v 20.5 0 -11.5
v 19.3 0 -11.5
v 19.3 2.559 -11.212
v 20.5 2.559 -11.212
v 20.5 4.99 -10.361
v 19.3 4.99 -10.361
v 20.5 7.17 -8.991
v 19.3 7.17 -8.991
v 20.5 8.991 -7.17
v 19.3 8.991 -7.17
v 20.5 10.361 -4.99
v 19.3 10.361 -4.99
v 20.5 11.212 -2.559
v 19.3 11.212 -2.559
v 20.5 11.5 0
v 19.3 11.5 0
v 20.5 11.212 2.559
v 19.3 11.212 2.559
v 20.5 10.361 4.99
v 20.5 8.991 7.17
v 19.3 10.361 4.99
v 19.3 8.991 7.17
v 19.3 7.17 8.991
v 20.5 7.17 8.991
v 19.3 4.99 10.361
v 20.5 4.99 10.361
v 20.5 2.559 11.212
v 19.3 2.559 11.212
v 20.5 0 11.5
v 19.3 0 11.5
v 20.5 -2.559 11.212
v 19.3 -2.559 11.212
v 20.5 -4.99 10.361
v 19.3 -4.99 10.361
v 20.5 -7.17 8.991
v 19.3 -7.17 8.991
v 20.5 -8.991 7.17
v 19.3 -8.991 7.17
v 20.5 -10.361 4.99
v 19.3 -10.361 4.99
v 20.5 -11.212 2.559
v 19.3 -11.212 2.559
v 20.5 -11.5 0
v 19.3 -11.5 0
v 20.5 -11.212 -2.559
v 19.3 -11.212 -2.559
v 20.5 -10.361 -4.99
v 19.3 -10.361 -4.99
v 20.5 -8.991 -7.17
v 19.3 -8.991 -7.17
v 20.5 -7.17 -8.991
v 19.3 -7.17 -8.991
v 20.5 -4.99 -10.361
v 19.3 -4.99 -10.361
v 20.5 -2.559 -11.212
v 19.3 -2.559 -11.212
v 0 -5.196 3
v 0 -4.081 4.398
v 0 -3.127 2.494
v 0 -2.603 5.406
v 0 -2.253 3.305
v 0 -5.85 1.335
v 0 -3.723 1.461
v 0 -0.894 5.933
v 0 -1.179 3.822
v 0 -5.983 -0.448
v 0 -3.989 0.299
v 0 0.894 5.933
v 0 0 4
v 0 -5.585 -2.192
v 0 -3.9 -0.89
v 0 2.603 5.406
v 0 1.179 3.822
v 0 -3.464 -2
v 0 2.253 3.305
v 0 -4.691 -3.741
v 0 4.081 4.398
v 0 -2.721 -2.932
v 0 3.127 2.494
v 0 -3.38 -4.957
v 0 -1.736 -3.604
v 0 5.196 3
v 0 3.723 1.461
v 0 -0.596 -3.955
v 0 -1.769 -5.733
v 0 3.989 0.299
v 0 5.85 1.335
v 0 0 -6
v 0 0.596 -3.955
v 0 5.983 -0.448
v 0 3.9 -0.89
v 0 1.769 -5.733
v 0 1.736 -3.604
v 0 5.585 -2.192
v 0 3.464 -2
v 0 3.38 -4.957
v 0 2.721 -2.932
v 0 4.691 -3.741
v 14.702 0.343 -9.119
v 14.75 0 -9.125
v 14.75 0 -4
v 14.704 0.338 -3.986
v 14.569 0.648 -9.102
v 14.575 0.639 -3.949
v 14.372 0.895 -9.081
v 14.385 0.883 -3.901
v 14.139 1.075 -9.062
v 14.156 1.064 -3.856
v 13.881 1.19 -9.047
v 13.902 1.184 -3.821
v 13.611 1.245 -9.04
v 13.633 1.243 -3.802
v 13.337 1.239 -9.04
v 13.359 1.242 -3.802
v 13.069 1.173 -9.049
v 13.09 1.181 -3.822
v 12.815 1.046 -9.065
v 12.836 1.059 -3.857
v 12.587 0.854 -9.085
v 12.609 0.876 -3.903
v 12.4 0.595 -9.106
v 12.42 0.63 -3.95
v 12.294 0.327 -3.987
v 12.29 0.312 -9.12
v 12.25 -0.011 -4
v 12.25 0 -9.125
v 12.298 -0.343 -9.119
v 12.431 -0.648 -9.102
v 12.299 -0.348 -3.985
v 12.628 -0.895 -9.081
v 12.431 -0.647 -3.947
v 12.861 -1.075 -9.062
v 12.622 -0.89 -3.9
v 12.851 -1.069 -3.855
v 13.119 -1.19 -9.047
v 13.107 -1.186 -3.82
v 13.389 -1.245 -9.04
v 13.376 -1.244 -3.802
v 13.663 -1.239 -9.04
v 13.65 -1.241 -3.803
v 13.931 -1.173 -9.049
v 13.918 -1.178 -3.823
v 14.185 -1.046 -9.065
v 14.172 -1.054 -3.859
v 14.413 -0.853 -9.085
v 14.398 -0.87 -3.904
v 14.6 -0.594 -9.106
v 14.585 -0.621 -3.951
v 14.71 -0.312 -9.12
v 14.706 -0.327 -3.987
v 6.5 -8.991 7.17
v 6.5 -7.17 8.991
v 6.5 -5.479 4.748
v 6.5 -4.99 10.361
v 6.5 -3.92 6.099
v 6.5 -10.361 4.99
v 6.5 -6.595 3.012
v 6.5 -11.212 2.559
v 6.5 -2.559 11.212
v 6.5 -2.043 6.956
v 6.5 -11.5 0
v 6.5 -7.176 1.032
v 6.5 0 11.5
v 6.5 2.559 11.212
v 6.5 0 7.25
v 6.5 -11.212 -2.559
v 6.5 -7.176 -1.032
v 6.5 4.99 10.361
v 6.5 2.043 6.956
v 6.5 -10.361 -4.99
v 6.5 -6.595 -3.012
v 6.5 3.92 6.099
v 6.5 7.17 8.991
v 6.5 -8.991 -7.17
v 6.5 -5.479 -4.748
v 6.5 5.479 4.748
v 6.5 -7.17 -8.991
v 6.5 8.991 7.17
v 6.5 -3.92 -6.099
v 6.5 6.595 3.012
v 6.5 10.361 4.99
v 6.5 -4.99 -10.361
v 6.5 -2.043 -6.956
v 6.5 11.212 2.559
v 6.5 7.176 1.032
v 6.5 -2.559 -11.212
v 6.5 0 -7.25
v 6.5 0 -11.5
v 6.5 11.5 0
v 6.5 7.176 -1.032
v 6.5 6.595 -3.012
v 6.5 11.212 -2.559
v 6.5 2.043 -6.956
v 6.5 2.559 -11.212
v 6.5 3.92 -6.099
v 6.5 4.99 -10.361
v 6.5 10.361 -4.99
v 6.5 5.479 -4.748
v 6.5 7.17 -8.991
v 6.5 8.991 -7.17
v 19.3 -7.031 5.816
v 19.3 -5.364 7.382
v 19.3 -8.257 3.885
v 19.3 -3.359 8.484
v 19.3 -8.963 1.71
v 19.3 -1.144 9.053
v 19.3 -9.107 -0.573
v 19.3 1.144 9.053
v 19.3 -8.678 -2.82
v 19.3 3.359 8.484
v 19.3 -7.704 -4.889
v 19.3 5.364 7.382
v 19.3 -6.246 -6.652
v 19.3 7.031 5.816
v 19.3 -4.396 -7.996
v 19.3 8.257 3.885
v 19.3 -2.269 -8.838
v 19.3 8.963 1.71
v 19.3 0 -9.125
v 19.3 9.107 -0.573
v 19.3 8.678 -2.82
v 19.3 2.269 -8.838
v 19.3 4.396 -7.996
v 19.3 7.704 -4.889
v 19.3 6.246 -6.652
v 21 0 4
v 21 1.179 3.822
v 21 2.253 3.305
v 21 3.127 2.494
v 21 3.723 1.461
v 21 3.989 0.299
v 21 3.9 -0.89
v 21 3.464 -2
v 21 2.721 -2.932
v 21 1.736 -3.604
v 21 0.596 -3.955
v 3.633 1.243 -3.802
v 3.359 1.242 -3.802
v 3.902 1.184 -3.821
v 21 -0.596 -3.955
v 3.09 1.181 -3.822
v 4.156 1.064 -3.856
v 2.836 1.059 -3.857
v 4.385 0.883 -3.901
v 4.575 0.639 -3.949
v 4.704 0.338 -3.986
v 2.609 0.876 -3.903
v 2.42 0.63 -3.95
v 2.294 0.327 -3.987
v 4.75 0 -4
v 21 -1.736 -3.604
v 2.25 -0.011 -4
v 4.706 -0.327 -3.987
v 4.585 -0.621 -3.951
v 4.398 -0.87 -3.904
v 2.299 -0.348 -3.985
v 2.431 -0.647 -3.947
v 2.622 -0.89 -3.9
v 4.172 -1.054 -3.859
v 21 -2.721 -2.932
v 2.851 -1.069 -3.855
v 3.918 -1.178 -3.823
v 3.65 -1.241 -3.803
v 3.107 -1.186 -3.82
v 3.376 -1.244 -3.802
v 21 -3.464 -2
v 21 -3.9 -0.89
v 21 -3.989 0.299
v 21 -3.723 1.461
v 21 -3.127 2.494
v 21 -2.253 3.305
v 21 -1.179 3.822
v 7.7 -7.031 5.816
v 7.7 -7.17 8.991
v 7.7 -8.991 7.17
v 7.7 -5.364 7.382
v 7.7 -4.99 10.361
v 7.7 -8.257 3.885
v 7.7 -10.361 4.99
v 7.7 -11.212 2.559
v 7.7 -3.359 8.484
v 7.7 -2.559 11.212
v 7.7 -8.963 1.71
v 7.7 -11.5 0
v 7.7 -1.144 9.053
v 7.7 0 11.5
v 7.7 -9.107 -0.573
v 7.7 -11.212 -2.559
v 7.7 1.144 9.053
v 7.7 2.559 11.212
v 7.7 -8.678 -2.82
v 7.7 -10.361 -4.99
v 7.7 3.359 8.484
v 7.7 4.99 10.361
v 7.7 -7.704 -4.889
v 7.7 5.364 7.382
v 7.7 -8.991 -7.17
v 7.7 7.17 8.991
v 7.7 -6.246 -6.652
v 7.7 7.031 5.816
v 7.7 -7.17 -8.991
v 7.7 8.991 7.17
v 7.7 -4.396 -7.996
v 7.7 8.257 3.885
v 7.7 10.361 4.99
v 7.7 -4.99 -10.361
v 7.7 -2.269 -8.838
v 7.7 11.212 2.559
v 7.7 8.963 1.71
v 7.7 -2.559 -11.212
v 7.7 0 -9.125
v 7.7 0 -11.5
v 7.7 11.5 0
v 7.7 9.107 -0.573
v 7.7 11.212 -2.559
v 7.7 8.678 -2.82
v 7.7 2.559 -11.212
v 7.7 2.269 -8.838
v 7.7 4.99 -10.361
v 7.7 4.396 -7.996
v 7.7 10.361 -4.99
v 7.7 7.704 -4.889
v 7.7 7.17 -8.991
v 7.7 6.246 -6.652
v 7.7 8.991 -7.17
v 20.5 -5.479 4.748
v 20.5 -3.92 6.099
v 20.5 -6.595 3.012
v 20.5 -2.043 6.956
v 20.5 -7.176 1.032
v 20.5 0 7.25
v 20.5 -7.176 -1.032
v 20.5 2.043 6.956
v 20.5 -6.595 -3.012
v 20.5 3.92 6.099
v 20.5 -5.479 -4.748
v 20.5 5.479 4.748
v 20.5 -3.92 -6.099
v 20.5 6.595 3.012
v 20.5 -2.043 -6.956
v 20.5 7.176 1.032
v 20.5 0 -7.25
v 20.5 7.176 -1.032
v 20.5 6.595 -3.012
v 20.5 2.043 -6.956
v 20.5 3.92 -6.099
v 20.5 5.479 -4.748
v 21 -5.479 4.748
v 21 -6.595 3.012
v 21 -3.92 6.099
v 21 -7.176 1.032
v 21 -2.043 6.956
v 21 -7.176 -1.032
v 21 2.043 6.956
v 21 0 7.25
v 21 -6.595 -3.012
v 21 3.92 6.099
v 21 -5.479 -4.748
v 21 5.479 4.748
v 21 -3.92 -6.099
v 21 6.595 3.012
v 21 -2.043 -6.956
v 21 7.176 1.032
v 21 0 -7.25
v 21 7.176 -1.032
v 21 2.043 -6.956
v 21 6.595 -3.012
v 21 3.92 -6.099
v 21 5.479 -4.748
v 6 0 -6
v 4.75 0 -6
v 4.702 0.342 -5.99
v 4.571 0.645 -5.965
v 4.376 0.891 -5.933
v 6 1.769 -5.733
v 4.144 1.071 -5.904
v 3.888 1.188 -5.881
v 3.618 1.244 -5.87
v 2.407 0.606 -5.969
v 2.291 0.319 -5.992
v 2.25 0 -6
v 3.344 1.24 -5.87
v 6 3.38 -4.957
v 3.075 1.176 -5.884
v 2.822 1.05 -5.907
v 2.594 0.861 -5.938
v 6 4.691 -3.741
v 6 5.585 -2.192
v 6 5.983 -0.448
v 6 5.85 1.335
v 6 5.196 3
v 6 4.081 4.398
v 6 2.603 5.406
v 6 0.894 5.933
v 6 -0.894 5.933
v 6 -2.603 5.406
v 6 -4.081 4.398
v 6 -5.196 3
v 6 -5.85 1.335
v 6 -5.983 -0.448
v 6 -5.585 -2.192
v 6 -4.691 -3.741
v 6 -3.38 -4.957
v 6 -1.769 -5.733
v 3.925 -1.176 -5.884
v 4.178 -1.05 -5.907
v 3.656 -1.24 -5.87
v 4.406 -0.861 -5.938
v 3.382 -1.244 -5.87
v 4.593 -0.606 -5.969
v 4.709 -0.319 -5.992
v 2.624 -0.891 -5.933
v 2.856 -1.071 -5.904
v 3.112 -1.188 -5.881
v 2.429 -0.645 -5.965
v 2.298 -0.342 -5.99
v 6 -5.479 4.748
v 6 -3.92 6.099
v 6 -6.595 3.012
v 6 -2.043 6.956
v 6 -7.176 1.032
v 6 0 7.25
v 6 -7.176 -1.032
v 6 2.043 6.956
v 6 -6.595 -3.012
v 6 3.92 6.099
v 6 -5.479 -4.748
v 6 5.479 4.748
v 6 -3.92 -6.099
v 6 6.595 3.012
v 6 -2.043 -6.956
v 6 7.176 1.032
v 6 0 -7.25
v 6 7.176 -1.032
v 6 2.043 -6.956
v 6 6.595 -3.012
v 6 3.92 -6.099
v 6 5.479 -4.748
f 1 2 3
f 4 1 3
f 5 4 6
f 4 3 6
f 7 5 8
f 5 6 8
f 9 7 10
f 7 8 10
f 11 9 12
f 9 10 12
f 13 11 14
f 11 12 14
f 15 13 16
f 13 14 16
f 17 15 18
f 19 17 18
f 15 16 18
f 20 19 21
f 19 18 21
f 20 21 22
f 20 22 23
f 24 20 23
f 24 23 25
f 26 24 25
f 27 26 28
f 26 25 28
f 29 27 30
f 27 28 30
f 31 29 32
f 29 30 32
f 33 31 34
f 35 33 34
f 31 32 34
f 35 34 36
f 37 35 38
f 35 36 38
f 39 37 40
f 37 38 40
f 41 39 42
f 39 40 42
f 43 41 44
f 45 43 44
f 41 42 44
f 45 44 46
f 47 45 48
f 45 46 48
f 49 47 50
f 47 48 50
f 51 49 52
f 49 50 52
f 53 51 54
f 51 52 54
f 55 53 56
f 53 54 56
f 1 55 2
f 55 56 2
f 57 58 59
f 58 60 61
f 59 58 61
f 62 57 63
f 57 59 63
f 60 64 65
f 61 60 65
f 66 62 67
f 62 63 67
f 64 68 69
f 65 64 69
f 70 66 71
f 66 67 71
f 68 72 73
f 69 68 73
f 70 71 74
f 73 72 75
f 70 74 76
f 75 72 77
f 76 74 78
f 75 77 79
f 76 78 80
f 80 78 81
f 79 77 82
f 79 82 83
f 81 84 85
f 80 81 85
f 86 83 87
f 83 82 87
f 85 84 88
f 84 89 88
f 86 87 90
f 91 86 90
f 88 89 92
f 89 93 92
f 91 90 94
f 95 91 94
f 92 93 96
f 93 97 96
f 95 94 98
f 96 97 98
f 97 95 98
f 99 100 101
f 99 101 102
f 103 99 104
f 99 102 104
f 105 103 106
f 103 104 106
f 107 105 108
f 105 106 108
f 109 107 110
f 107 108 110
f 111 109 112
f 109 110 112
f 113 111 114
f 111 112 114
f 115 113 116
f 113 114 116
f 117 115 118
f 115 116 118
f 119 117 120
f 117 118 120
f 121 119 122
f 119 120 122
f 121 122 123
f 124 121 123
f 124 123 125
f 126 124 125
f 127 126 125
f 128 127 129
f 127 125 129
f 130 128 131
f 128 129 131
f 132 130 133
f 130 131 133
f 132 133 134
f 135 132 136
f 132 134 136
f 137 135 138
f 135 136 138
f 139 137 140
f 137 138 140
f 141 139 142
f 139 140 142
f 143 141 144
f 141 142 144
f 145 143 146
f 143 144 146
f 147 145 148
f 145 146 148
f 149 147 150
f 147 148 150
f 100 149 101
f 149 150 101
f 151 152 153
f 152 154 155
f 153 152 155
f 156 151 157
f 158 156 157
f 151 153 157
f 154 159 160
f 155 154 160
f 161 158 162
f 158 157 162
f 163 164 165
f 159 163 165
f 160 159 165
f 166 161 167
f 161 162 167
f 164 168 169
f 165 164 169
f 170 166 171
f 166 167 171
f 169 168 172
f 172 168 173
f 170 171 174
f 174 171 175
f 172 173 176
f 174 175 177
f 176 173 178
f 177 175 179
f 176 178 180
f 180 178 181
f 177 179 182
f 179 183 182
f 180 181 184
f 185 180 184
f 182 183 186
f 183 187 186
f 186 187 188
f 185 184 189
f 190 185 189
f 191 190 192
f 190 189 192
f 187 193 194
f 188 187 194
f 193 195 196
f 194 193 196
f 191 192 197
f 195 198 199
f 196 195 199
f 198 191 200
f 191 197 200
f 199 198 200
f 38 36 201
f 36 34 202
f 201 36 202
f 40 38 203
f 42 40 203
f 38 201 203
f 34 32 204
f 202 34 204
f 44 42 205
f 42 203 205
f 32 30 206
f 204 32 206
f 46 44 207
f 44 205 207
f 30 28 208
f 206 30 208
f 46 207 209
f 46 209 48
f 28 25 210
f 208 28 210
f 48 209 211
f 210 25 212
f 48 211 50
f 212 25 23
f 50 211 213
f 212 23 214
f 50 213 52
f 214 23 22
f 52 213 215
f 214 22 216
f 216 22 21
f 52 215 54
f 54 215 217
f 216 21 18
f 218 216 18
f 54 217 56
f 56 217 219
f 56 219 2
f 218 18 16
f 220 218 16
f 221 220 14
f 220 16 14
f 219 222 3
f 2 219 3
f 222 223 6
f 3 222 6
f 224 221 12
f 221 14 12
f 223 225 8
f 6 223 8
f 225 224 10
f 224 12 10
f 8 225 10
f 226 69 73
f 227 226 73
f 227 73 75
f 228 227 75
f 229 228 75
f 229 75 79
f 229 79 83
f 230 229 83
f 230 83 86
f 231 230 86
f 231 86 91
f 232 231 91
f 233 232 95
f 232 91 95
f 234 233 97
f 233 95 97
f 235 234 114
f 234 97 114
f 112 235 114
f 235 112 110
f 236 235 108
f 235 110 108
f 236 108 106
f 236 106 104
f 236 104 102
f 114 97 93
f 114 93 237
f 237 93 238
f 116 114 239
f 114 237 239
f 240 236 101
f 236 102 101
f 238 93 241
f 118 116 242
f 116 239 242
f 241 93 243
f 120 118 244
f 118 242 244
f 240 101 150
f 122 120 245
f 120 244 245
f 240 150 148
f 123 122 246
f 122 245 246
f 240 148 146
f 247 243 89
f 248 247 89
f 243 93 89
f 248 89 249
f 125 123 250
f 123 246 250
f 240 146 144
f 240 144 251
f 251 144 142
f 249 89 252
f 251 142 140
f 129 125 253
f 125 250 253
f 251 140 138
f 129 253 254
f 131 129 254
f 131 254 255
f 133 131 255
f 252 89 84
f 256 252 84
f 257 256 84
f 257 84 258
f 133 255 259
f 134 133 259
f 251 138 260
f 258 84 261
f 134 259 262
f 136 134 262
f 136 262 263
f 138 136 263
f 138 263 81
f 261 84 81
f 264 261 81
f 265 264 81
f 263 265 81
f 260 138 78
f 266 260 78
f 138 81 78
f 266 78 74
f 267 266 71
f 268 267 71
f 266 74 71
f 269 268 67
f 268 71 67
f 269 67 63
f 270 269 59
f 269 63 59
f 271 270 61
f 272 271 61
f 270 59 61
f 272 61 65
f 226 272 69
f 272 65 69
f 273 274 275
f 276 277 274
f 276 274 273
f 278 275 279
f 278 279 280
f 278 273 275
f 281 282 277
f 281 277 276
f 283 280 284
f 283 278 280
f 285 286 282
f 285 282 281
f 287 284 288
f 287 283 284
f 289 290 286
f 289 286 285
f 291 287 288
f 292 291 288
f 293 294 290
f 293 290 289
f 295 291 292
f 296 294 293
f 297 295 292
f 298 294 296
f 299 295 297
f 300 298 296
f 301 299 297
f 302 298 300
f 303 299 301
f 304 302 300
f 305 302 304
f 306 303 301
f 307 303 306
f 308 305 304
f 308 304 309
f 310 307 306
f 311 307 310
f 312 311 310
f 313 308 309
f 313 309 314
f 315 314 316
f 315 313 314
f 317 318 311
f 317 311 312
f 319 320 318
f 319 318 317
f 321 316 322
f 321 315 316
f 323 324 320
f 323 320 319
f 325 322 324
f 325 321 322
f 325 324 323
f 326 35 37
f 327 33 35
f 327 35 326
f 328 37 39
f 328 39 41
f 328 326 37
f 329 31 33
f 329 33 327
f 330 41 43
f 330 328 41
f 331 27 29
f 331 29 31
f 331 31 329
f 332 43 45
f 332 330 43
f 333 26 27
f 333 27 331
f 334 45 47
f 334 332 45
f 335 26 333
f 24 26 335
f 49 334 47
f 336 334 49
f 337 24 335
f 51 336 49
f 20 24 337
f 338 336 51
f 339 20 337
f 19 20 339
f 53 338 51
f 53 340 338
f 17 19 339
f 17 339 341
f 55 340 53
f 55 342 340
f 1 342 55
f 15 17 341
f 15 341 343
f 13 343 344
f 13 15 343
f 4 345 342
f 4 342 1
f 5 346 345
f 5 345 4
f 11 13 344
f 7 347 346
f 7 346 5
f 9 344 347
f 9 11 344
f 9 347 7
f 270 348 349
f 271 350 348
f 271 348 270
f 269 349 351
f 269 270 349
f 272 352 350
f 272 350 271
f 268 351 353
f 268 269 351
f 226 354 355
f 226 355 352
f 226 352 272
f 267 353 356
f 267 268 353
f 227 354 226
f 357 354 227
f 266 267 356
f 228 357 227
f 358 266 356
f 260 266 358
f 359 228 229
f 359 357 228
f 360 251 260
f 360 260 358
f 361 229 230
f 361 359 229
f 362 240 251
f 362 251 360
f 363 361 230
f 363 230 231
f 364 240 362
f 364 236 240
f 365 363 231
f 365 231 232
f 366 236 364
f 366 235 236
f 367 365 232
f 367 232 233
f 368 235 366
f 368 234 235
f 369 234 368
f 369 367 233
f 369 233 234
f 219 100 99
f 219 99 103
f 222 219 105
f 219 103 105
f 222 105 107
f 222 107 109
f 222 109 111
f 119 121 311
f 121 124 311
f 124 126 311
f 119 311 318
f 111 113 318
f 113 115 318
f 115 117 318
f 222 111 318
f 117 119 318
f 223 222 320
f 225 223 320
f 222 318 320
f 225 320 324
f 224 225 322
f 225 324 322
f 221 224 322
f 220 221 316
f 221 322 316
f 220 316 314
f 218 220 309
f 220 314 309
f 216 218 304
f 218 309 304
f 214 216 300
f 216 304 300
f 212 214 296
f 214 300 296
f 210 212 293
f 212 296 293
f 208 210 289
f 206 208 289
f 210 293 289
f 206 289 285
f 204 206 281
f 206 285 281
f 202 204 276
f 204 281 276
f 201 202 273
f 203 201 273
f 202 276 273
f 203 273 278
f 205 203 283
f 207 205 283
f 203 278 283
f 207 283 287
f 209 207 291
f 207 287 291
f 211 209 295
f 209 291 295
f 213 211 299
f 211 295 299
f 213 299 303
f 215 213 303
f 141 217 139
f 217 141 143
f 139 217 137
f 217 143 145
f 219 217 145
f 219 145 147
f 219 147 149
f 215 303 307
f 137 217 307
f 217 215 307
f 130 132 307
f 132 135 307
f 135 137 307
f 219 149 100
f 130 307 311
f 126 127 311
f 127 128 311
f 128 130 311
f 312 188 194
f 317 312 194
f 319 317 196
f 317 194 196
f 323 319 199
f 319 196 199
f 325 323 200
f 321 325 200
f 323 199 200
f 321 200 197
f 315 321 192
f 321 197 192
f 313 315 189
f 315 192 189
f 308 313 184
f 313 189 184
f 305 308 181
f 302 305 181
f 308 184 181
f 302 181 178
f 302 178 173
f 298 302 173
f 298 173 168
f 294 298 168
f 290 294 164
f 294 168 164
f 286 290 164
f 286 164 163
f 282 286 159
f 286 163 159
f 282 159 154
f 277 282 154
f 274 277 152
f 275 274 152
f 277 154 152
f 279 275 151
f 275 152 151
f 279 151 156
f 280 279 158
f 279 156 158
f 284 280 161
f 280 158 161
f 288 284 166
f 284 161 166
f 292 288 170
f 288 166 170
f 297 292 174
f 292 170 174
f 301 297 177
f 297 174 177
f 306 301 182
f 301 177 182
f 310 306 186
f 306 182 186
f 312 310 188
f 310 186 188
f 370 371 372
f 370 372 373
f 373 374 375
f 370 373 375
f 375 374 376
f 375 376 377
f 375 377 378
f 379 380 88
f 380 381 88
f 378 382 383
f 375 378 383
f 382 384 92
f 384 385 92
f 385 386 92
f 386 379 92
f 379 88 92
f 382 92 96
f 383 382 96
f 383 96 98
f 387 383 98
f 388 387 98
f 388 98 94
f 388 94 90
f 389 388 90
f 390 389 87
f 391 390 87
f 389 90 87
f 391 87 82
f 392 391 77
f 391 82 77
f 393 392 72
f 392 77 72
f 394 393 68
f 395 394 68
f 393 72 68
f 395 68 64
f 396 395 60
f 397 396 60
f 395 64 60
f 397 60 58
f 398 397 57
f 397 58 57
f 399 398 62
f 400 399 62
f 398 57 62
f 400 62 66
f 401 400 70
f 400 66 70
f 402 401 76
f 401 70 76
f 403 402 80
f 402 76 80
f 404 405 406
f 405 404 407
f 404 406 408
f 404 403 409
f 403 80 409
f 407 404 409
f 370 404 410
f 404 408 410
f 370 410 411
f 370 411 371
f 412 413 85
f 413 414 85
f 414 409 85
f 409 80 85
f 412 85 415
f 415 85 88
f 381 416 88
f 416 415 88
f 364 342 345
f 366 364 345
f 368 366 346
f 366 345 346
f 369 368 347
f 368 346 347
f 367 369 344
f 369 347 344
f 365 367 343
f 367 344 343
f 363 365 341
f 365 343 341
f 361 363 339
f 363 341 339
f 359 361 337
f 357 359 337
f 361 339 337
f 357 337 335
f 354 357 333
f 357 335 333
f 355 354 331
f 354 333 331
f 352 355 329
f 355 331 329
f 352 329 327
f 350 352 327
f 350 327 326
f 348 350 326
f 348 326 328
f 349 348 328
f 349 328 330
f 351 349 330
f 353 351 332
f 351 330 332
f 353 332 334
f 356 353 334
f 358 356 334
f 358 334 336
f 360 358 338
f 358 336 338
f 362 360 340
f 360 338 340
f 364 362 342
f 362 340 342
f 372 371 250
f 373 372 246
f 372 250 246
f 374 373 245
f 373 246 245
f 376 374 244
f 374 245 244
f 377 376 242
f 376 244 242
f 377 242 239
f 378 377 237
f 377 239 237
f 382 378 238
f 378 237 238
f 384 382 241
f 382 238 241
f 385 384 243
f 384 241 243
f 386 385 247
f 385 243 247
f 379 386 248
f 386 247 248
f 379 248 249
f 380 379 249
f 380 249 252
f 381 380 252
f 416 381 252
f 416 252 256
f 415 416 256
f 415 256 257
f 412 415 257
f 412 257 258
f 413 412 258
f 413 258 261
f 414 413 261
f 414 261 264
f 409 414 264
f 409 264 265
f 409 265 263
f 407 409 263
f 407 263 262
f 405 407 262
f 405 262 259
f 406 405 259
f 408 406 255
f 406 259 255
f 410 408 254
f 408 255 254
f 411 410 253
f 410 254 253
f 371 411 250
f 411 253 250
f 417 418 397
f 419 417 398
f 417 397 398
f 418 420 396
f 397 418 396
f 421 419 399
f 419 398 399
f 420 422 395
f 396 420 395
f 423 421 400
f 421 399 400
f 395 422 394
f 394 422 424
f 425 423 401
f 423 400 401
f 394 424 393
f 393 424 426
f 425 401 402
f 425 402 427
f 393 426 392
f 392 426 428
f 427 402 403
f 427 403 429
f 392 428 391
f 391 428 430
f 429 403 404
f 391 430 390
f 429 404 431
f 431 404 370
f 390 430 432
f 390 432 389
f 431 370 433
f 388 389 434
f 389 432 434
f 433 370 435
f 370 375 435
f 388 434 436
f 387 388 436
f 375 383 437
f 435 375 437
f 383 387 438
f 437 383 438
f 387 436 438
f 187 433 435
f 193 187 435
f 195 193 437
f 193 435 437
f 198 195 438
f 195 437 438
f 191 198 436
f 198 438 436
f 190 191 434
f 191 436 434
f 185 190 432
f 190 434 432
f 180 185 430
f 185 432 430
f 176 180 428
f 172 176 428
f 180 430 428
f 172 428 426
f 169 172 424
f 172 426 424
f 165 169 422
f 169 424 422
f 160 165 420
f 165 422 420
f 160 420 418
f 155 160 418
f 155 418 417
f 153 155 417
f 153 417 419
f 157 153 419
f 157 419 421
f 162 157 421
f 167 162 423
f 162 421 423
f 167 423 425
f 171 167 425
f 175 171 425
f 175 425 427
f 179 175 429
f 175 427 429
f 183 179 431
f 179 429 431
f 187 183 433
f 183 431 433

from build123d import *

# Parameters (mm, degrees)
CROQUIS1_R                    = 6
SALIENTE_EXTRUIR1_DEPTH       = 6
CROQUIS2_R                    = 7.25
SALIENTE_EXTRUIR2_DEPTH       = 0.5
CROQUIS3_R                    = 11.5
SALIENTE_EXTRUIR3_DEPTH       = 1.2
CROQUIS4_R                    = 9.125
SALIENTE_EXTRUIR4_DEPTH       = 11.6
CROQUIS5_R                    = 11.5
SALIENTE_EXTRUIR5_DEPTH       = 1.2
CROQUIS6_R                    = 7.25
SALIENTE_EXTRUIR6_DEPTH       = 0.5
CROQUIS7_R                    = 4
CORTAR_EXTRUIR1_DEPTH         = 27.561249971
TALADRO_ROSCADO_M32_D         = 2.5
TALADRO_ROSCADO_M32_DEPTH     = 8.5
TALADRO_ROSCADO_M32_TIP       = 0.751075774
TALADRO_ROSCADO_M33_OUTLINE_W = 1.25
TALADRO_ROSCADO_M33_OUTLINE_H = 5.325356109


# Read off the part's stored shape, not the designer's step: Taladro roscado M33
with BuildPart() as part:
    # Croquis1 → Saliente-Extruir1 (new body)
    with BuildSketch(Plane(origin=(0, 0, 0), x_dir=(0, 0, -1), z_dir=(1, 0, 0))):
        Circle(CROQUIS1_R)
    extrude(amount=SALIENTE_EXTRUIR1_DEPTH)

    # Croquis2 → Saliente-Extruir2 (add)
    with BuildSketch(Plane(origin=(6, 0, 0), x_dir=(0, 0, -1), z_dir=(1, 0, 0))):
        Circle(CROQUIS2_R)
    extrude(amount=SALIENTE_EXTRUIR2_DEPTH)

    # Croquis3 → Saliente-Extruir3 (add)
    with BuildSketch(Plane(origin=(6.5, 0, 0), x_dir=(0, 0, -1), z_dir=(1, 0, 0))):
        Circle(CROQUIS3_R)
    extrude(amount=SALIENTE_EXTRUIR3_DEPTH)

    # Croquis4 → Saliente-Extruir4 (add)
    with BuildSketch(Plane(origin=(7.7, 0, 0), x_dir=(0, 0, -1), z_dir=(1, 0, 0))):
        Circle(CROQUIS4_R)
    extrude(amount=SALIENTE_EXTRUIR4_DEPTH)

    # Croquis5 → Saliente-Extruir5 (add)
    with BuildSketch(Plane(origin=(19.3, 0, 0), x_dir=(0, 0, -1), z_dir=(1, 0, 0))):
        Circle(CROQUIS5_R)
    extrude(amount=SALIENTE_EXTRUIR5_DEPTH)

    # Croquis6 → Saliente-Extruir6 (add)
    with BuildSketch(Plane(origin=(20.5, 0, 0), x_dir=(0, 0, -1), z_dir=(1, 0, 0))):
        Circle(CROQUIS6_R)
    extrude(amount=SALIENTE_EXTRUIR6_DEPTH)

    # Croquis7 → Cortar-Extruir1 (cut, through all)
    with BuildSketch(Plane.ZY):
        Circle(CROQUIS7_R)
    extrude(amount=-CORTAR_EXTRUIR1_DEPTH, mode=Mode.SUBTRACT)

    # Taladro roscado M32
    with Locations(Plane(origin=(0, 0, -6), x_dir=(-1, 0, 0), z_dir=(0, 0, -1))):
        with Locations((-3.5, 0)):
            Hole(TALADRO_ROSCADO_M32_D / 2, depth=TALADRO_ROSCADO_M32_DEPTH)
            with Locations((0, 0, -(TALADRO_ROSCADO_M32_DEPTH + TALADRO_ROSCADO_M32_TIP / 2))):  # 118° drill point
                Cone(0, TALADRO_ROSCADO_M32_D / 2, TALADRO_ROSCADO_M32_TIP, mode=Mode.SUBTRACT)

    # Taladro roscado M33 outline → Taladro roscado M33 (revolve, cut)
    with BuildSketch(Plane(origin=(13.5, 0, 0), x_dir=(1, 0, 0), z_dir=(0, -1, 0))):
        with Locations((0.625, -6.462322169)):
            Rectangle(TALADRO_ROSCADO_M33_OUTLINE_W, TALADRO_ROSCADO_M33_OUTLINE_H)
    revolve(axis=Axis((13.5, 0, 0), (0, 0, 1)), mode=Mode.SUBTRACT)


solid = part.part
